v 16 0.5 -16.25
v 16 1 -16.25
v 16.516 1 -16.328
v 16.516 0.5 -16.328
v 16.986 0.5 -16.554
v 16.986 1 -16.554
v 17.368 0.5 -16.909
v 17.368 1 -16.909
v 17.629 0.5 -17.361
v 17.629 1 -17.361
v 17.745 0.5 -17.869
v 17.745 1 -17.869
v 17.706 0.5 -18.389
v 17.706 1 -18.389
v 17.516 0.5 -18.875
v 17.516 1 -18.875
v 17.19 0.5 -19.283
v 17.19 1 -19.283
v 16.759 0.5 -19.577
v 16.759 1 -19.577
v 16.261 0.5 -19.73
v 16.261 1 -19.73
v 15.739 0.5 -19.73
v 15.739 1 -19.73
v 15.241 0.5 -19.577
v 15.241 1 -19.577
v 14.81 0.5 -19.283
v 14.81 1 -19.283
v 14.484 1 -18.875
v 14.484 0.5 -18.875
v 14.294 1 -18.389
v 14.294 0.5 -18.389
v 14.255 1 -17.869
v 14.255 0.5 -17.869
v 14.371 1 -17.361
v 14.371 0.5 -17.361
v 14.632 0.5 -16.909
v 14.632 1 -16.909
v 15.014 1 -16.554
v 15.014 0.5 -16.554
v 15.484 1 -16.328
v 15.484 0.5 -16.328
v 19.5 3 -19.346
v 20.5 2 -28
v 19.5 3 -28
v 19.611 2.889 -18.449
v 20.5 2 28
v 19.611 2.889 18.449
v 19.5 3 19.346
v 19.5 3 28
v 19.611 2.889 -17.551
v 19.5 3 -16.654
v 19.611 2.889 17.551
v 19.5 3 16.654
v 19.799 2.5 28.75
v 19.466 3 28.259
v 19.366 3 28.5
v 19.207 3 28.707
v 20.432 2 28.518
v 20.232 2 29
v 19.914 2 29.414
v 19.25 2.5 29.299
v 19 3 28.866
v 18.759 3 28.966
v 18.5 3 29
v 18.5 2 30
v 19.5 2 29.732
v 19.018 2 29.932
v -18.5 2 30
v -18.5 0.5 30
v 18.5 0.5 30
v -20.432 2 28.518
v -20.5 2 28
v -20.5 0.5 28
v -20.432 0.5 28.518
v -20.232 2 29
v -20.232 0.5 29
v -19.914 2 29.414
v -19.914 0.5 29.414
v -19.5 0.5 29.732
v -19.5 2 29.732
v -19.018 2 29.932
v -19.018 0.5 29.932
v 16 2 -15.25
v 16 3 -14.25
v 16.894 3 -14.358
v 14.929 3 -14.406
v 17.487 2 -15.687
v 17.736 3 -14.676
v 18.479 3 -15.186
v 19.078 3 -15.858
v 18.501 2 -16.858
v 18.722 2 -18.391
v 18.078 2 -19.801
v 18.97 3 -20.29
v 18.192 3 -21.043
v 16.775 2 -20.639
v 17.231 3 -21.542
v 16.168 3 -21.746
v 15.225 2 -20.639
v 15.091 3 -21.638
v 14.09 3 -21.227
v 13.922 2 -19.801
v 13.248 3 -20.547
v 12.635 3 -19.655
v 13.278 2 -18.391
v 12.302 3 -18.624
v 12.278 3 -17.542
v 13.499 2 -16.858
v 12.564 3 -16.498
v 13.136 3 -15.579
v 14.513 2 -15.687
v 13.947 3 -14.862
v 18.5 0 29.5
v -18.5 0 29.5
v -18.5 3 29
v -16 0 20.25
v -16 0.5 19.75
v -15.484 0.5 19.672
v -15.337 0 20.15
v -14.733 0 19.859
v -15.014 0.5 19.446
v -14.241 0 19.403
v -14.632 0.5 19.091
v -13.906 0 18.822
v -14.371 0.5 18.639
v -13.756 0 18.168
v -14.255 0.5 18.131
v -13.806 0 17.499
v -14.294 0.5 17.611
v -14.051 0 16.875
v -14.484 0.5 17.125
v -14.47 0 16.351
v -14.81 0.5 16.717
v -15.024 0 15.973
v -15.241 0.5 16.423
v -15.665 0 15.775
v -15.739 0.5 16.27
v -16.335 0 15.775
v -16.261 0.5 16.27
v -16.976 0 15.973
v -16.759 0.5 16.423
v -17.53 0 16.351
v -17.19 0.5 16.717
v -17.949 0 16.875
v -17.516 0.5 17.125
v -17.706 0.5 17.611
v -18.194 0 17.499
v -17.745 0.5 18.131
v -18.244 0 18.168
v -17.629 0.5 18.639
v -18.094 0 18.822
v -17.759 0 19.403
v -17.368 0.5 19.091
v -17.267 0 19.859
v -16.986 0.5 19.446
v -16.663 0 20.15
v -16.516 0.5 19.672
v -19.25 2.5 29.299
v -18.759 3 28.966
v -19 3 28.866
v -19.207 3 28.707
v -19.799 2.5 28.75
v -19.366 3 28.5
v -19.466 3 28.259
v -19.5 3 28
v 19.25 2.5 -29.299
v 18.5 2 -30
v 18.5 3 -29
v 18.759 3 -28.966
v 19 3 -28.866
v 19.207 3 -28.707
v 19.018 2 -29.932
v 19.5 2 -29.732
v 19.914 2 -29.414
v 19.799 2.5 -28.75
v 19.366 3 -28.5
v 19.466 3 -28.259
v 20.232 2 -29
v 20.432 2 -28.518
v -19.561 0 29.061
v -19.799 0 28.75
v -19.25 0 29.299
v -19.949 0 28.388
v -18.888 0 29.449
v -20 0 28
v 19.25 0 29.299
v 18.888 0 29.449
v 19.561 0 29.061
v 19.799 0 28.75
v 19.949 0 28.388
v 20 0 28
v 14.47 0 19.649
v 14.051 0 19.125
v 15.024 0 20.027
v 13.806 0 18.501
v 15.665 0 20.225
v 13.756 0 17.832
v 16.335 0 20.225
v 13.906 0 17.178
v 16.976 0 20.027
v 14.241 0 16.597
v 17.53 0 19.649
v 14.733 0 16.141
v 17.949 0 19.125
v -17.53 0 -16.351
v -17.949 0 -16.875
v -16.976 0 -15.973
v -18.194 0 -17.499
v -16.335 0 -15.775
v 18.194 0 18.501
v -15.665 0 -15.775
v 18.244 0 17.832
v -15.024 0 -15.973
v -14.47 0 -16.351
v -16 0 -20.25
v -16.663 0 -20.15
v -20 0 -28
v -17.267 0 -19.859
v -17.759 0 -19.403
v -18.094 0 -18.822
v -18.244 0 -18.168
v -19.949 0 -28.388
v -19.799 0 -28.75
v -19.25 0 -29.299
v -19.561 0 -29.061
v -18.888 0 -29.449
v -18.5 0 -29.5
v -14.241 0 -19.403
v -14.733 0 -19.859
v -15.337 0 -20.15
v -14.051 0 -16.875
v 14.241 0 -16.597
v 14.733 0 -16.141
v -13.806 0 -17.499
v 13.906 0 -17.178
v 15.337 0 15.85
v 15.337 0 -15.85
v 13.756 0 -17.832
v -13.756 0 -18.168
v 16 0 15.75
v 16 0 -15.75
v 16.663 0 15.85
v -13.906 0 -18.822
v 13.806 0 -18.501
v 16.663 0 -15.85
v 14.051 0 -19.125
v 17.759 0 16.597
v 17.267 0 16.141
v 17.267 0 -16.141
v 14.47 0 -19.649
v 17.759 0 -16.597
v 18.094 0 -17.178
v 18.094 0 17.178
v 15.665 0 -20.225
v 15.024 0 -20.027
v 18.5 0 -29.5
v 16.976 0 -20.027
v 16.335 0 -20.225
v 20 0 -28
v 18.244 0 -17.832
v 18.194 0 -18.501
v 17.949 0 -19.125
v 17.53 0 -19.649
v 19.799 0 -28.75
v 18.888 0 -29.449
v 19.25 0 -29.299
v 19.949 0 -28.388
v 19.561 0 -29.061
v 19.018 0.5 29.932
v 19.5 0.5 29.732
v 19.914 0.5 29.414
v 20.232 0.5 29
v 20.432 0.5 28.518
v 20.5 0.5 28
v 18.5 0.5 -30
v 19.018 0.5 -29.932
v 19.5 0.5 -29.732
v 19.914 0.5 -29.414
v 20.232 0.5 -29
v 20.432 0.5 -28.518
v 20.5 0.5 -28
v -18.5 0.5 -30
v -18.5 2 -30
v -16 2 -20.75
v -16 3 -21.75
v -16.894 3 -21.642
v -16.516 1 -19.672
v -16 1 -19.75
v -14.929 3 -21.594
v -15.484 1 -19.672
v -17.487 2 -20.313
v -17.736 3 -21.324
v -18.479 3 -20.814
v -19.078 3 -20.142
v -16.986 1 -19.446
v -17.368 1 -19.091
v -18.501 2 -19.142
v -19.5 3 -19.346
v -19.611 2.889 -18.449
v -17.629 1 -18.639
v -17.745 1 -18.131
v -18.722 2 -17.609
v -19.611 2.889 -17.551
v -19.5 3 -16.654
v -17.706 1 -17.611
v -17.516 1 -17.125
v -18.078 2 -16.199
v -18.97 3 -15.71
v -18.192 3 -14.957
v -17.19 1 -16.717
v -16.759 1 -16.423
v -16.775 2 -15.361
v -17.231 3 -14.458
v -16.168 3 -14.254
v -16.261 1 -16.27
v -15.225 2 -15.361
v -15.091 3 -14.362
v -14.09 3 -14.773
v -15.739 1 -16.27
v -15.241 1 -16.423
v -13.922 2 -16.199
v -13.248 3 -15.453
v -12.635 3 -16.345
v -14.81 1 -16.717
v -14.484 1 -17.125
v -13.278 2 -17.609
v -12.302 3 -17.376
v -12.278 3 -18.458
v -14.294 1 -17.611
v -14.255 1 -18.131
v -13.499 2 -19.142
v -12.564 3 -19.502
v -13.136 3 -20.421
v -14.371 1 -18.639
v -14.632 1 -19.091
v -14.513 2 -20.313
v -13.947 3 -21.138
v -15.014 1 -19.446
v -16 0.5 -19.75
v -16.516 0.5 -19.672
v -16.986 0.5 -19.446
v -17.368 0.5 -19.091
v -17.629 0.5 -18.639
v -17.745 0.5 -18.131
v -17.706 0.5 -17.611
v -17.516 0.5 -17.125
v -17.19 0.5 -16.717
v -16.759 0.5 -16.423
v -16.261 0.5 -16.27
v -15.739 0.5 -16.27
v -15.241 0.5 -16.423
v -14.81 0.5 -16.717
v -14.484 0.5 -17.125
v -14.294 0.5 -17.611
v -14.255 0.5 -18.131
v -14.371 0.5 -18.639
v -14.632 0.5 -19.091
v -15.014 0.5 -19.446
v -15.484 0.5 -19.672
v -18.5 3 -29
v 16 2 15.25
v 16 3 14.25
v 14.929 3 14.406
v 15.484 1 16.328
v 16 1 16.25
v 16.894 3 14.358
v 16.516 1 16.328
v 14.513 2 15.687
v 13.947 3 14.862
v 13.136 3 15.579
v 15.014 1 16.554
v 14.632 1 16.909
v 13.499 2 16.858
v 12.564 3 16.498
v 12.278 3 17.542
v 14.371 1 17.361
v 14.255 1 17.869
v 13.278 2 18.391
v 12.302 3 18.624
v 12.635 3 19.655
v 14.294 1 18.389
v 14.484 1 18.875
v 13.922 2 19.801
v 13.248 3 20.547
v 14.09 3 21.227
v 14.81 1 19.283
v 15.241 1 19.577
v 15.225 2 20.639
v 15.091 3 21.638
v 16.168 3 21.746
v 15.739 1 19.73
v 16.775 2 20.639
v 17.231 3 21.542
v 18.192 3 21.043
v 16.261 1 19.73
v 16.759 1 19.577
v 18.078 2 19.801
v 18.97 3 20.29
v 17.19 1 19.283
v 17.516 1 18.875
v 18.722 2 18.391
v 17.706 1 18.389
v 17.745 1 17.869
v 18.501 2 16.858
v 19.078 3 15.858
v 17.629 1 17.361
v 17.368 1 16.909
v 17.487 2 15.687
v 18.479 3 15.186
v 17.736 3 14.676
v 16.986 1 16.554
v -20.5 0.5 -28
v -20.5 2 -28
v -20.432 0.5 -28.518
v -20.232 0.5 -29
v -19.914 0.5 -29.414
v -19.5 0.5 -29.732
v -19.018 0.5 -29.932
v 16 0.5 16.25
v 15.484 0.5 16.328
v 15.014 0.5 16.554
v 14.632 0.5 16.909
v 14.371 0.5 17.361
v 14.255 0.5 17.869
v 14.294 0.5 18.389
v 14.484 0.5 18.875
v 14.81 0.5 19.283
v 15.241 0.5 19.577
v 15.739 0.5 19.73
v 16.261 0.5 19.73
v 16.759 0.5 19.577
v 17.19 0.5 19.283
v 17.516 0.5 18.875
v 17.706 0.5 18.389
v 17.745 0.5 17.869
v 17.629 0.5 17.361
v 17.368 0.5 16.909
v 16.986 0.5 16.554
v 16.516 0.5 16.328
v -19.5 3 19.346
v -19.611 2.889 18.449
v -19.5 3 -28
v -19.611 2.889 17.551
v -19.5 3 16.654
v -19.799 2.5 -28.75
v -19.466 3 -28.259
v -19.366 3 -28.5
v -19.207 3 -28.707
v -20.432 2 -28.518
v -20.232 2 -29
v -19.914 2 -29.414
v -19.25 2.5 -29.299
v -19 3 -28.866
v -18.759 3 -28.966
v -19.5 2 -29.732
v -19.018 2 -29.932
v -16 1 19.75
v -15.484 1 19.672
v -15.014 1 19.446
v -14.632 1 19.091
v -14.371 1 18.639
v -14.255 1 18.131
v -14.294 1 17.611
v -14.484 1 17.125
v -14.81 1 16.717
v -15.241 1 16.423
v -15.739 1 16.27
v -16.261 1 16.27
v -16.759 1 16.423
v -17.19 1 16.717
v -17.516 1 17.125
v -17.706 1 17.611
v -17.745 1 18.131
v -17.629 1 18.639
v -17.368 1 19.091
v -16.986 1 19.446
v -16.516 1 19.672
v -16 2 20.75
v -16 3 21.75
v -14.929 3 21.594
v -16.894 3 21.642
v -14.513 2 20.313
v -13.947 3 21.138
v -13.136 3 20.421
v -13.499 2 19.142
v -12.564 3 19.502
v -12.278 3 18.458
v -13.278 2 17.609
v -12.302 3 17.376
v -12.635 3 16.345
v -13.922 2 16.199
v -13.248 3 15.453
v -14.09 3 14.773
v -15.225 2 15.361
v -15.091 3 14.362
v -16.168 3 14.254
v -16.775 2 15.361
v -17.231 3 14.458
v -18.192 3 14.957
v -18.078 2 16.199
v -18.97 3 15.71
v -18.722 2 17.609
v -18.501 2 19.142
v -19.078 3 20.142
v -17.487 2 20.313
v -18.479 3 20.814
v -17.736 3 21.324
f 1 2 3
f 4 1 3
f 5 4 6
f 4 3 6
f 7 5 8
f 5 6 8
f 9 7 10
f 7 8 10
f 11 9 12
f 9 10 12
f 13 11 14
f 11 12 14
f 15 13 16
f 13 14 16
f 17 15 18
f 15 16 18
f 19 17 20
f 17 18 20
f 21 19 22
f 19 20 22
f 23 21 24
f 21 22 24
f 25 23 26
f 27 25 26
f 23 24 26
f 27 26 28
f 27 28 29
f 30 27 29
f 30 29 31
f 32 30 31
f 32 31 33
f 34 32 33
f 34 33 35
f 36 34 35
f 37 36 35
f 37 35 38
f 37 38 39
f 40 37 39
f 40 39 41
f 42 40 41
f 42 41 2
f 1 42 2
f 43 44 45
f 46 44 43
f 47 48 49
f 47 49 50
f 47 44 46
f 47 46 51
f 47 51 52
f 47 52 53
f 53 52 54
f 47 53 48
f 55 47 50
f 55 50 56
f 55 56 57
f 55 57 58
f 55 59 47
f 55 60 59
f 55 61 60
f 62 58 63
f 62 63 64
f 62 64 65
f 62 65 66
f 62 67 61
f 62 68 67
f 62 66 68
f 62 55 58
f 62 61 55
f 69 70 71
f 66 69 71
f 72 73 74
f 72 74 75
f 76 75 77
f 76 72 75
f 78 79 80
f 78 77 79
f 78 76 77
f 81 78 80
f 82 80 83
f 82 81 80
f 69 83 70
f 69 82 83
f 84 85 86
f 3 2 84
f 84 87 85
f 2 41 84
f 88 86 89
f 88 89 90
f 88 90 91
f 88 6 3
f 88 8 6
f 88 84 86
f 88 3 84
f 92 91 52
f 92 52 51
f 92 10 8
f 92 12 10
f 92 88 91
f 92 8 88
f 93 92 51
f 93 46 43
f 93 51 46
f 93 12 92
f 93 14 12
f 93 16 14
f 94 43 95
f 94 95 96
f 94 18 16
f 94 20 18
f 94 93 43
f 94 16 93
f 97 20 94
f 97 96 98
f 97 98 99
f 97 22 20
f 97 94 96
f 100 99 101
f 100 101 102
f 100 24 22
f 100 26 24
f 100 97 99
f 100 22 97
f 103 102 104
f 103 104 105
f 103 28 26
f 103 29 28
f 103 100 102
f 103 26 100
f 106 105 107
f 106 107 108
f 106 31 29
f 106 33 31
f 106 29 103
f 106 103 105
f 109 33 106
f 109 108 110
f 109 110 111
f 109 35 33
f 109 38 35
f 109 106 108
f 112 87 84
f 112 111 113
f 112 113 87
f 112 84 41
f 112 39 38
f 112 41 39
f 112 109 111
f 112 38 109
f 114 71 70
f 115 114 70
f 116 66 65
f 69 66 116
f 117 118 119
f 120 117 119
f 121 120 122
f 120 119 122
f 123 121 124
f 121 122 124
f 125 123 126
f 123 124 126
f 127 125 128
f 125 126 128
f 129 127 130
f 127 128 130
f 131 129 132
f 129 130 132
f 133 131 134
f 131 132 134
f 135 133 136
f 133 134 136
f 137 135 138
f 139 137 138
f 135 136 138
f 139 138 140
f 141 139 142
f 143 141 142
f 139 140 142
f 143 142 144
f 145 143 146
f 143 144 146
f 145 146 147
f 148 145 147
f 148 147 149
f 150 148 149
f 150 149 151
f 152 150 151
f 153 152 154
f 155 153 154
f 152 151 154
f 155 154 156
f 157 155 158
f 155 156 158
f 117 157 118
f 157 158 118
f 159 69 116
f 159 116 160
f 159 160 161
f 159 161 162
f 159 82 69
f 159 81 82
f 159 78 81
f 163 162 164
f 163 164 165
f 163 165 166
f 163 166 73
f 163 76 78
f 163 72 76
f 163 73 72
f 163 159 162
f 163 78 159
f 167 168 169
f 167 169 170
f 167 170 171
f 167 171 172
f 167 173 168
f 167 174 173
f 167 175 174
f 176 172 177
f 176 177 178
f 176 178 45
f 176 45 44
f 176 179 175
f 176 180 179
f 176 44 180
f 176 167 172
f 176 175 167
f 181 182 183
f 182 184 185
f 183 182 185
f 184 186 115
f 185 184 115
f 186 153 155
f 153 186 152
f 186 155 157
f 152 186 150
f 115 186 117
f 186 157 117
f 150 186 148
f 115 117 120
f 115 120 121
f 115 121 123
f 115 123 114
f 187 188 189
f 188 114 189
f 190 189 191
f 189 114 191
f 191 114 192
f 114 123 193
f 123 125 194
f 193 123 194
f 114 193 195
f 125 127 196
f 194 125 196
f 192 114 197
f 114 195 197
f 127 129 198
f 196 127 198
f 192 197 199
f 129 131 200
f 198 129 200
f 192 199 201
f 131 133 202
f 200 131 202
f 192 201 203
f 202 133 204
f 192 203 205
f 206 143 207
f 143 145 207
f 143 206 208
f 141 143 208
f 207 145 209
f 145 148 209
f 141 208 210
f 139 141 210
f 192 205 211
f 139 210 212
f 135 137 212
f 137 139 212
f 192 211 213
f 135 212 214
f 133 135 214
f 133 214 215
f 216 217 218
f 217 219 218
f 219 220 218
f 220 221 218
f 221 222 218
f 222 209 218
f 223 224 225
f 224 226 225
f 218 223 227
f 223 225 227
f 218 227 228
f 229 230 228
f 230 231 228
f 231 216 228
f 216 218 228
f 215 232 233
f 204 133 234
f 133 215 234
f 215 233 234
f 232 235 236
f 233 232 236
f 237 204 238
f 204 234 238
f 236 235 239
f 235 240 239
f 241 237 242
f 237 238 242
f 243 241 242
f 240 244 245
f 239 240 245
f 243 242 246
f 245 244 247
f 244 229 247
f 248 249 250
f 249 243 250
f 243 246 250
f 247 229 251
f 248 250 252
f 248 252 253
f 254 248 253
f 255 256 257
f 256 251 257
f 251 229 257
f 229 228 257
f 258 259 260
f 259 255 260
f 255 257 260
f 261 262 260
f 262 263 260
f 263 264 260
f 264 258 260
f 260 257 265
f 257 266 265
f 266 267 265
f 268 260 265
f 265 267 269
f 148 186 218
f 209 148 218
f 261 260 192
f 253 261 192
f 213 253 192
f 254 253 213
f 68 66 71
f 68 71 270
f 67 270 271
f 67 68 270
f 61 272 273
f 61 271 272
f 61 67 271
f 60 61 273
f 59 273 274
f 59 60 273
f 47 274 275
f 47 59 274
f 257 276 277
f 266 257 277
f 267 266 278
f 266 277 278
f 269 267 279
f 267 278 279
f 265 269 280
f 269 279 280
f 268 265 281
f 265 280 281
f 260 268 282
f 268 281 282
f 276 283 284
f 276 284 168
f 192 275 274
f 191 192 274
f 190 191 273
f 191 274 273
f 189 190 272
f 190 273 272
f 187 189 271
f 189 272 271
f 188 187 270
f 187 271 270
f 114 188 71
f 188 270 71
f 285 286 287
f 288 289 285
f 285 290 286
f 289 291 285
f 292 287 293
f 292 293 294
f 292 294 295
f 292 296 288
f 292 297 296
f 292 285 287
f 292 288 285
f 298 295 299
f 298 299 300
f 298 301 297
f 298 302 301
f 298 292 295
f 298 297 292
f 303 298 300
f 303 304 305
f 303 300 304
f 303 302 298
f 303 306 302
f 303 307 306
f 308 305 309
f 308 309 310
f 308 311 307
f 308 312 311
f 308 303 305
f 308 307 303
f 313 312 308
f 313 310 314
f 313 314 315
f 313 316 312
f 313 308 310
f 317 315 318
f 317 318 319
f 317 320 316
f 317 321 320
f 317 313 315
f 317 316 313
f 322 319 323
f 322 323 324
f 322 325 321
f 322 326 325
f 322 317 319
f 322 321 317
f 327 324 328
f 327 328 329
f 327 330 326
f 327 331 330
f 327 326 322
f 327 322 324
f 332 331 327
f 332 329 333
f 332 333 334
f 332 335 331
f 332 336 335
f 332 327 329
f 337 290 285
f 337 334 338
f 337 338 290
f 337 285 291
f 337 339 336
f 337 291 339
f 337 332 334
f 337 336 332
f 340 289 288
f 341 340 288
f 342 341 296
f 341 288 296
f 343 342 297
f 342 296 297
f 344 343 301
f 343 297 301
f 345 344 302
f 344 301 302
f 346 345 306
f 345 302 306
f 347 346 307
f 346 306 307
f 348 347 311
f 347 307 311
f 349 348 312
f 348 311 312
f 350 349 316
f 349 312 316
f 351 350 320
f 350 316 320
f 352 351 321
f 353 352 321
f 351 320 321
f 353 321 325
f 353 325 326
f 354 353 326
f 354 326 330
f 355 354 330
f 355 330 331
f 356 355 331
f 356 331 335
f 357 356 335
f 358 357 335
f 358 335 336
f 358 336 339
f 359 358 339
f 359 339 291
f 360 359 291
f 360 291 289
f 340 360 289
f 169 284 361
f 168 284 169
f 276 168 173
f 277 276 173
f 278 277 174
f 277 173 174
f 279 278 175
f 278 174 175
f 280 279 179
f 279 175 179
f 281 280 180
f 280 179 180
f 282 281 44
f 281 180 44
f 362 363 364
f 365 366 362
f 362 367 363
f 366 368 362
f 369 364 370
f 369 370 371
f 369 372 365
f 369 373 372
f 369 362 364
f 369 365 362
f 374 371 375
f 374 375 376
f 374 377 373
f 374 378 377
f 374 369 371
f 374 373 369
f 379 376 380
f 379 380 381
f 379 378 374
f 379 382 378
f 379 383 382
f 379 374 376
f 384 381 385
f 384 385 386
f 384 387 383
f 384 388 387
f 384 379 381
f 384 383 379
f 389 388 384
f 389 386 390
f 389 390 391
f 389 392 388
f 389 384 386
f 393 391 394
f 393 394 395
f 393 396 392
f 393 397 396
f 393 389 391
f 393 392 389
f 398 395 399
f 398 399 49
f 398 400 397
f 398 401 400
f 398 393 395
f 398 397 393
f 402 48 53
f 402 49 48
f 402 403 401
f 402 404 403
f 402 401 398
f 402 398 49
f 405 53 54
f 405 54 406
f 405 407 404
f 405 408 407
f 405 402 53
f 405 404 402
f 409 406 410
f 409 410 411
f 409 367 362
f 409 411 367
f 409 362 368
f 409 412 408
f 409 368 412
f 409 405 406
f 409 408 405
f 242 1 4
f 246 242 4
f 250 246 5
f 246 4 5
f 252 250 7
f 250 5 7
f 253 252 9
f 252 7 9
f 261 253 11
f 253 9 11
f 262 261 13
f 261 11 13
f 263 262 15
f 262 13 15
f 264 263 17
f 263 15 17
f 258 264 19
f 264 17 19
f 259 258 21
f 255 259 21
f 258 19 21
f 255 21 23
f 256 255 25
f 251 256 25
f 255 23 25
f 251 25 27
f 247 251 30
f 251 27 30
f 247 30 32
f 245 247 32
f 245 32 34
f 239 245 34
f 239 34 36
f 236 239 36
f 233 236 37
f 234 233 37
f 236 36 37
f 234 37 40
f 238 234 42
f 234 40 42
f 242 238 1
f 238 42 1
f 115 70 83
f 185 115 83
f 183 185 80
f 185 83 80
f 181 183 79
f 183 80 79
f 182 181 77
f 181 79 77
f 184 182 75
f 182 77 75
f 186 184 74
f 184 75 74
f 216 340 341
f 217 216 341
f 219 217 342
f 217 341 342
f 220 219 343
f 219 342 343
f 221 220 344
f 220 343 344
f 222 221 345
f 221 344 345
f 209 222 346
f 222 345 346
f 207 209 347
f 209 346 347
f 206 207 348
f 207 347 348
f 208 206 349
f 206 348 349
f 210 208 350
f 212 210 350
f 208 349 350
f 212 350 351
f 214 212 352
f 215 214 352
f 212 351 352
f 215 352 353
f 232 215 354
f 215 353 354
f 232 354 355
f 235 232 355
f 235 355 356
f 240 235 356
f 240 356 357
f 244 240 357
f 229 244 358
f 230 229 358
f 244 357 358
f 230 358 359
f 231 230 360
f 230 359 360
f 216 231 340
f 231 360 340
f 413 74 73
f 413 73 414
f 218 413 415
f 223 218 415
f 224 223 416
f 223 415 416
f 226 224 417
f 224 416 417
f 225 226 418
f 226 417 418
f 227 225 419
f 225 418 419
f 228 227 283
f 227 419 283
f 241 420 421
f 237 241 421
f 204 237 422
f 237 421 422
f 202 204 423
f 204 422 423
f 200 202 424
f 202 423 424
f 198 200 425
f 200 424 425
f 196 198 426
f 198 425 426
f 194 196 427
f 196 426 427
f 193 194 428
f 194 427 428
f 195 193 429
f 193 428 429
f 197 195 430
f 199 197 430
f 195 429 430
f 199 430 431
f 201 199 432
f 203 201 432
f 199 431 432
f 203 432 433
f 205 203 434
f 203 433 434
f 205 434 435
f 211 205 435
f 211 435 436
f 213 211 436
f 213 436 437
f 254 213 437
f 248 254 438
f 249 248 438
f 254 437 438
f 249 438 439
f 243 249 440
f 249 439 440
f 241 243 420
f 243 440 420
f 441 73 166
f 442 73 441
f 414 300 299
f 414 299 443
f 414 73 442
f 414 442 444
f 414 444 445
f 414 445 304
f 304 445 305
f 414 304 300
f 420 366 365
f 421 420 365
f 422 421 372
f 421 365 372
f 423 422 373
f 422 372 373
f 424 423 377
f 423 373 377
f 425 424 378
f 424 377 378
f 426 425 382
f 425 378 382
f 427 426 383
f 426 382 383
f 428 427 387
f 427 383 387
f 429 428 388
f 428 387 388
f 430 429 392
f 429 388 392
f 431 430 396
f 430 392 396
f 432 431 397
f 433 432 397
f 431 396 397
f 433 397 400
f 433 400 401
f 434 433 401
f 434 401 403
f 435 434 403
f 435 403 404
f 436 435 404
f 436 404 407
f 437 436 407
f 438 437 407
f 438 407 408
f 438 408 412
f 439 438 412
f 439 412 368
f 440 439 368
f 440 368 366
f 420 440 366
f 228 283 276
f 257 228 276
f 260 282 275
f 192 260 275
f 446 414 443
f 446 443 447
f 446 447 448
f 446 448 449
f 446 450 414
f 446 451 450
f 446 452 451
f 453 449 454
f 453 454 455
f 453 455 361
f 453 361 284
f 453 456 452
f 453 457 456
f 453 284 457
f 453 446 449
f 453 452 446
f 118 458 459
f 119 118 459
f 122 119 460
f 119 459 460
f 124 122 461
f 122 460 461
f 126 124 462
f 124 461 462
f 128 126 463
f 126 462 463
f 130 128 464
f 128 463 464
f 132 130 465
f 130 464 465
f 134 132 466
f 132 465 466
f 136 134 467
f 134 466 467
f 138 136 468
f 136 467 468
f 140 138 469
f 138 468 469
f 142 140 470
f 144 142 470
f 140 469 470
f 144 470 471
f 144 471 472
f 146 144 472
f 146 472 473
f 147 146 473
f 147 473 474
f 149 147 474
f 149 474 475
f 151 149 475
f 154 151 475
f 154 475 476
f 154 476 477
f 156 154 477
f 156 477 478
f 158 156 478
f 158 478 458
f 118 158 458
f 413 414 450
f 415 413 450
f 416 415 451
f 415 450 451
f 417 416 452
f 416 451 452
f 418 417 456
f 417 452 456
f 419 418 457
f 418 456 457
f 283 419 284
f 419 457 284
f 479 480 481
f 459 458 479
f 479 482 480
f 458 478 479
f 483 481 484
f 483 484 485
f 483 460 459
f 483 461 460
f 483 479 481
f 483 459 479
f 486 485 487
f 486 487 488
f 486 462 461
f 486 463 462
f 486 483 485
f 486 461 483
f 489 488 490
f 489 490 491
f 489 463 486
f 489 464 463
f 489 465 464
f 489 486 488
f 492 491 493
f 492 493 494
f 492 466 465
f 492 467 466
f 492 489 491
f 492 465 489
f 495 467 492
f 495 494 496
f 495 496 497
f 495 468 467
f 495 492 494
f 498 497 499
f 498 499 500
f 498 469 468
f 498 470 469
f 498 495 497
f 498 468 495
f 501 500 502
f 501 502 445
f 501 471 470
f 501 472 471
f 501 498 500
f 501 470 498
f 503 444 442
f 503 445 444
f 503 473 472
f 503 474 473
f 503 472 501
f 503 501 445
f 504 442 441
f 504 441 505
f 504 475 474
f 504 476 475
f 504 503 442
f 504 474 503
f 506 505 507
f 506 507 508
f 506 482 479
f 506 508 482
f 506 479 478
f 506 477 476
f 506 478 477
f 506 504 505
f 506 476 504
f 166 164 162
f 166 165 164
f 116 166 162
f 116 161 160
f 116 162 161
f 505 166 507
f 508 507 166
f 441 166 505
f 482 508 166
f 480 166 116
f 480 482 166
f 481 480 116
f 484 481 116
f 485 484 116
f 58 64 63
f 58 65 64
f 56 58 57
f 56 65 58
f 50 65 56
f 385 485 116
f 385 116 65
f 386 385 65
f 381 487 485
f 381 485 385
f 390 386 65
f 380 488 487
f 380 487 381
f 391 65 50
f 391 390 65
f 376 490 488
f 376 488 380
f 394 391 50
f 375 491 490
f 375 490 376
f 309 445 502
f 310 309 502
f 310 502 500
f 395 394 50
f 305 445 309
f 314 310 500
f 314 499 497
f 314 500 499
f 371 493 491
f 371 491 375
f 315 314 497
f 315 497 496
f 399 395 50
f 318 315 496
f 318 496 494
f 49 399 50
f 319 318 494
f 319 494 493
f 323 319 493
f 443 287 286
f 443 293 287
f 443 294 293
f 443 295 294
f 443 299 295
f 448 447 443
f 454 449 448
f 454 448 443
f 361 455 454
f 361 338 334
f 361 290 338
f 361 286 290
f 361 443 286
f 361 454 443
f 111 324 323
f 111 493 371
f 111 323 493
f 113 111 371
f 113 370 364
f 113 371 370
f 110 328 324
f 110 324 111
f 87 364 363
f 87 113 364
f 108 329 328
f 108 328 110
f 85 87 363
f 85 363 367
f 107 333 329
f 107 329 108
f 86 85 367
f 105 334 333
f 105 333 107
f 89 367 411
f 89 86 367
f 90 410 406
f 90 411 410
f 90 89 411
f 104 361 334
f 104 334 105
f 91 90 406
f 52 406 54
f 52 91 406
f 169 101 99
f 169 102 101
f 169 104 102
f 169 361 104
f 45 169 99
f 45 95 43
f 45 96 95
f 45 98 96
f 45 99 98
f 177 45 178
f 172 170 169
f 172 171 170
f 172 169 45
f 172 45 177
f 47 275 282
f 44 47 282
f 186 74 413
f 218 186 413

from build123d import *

# Parameters (mm, degrees)
SKETCH_1_W          = 41
SKETCH_1_H          = 60
EXTRUDE_1_DEPTH     = 3
SKETCH_2_R          = 1.75
CUT_EXTRUDE_1_DEPTH = 3
FILLET_1_R          = 2
CHAMFER_2_SIZE      = 1
CHAMFER_1_SIZE      = 2
CHAMFER_3_SIZE      = 0.5


with BuildPart() as part:
    # Эскиз1 → Бобышка-Вытянуть1 (new body)
    with BuildSketch(Plane(origin=(0, 0, 0), x_dir=(1, 0, 0), z_dir=(0, 1, 0))):
        Rectangle(SKETCH_1_W, SKETCH_1_H)
    extrude(amount=EXTRUDE_1_DEPTH)

    # Эскиз2 → Вырез-Вытянуть1 (cut)
    with BuildSketch(Plane(origin=(0, 3, 0), x_dir=(1, 0, 0), z_dir=(0, 1, 0))):
        with Locations(Location((16, 18, 0), (0, 0, 270))):
            Circle(SKETCH_2_R)
        with Locations(Location((16, -18, 0), (0, 0, 90))):
            Circle(SKETCH_2_R)
        with Locations(Location((-16, -18, 0), (0, 0, 270))):
            Circle(SKETCH_2_R)
        with Locations(Location((-16, 18, 0), (0, 0, 90))):
            Circle(SKETCH_2_R)
    extrude(amount=-CUT_EXTRUDE_1_DEPTH, mode=Mode.SUBTRACT)

    # Скругление1
    fillet_1_edges = [part.edges().sort_by_distance(p)[0] for p in [
        (20.5, 1.5, 30),
        (-20.5, 1.5, 30),
        (-20.5, 1.5, -30),
        (20.5, 1.5, -30),
    ]]
    fillet(fillet_1_edges, radius=FILLET_1_R)

    # Фаска2
    chamfer_2_edges = [part.edges().sort_by_distance(p)[0] for p in [
        (0, 3, -30),
        (20.5, 3, 0),
        (-20.5, 3, 0),
        (0, 3, 30),
        (19.914213562, 3, 29.414213562),
        (-19.914213562, 3, 29.414213562),
        (-19.914213562, 3, -29.414213562),
        (19.914213562, 3, -29.414213562),
    ]]
    chamfer(chamfer_2_edges, length=CHAMFER_2_SIZE)

    # Фаска1
    # the kernel refuses this chamfer: 2 mm, written as the material it takes off along each edge
    with BuildSketch(Plane(origin=(-16, 3, -18), x_dir=(0, 0, -1), z_dir=(1, 0, 0))) as chamfer_1_piece_1:
        Polygon((1.75 + CHAMFER_1_SIZE, 0), (1.75, -CHAMFER_1_SIZE), (1.75, 0), align=None)
    revolve(axis=Axis((-16, 3, -18), (0, 1, 0)), mode=Mode.SUBTRACT)
    with BuildSketch(Plane(origin=(-16, 3, 18), x_dir=(0, 0, 1), z_dir=(-1, 0, 0))) as chamfer_1_piece_2:
        Polygon((1.75 + CHAMFER_1_SIZE, 0), (1.75, -CHAMFER_1_SIZE), (1.75, 0), align=None)
    revolve(axis=Axis((-16, 3, 18), (0, 1, 0)), mode=Mode.SUBTRACT)
    with BuildSketch(Plane(origin=(16, 3, 18), x_dir=(0, 0, -1), z_dir=(1, 0, 0))) as chamfer_1_piece_3:
        Polygon((1.75 + CHAMFER_1_SIZE, 0), (1.75, -CHAMFER_1_SIZE), (1.75, 0), align=None)
    revolve(axis=Axis((16, 3, 18), (0, 1, 0)), mode=Mode.SUBTRACT)
    with BuildSketch(Plane(origin=(16, 3, -18), x_dir=(0, 0, 1), z_dir=(-1, 0, 0))) as chamfer_1_piece_4:
        Polygon((1.75 + CHAMFER_1_SIZE, 0), (1.75, -CHAMFER_1_SIZE), (1.75, 0), align=None)
    revolve(axis=Axis((16, 3, -18), (0, 1, 0)), mode=Mode.SUBTRACT)

    # Фаска3
    chamfer_3_edges = [part.edges().sort_by_distance(p)[0] for p in [
        (-16, 0, -16.25),
        (-16, 0, 16.25),
        (16, 0, 19.75),
        (16, 0, -19.75),
        (0, 0, -30),
        (20.5, 0, 0),
        (0, 0, 30),
        (-20.5, 0, 0),
        (19.914213562, 0, 29.414213562),
        (-19.914213562, 0, 29.414213562),
        (-19.914213562, 0, -29.414213562),
        (19.914213562, 0, -29.414213562),
    ]]
    chamfer(chamfer_3_edges, length=CHAMFER_3_SIZE)


solid = part.part
